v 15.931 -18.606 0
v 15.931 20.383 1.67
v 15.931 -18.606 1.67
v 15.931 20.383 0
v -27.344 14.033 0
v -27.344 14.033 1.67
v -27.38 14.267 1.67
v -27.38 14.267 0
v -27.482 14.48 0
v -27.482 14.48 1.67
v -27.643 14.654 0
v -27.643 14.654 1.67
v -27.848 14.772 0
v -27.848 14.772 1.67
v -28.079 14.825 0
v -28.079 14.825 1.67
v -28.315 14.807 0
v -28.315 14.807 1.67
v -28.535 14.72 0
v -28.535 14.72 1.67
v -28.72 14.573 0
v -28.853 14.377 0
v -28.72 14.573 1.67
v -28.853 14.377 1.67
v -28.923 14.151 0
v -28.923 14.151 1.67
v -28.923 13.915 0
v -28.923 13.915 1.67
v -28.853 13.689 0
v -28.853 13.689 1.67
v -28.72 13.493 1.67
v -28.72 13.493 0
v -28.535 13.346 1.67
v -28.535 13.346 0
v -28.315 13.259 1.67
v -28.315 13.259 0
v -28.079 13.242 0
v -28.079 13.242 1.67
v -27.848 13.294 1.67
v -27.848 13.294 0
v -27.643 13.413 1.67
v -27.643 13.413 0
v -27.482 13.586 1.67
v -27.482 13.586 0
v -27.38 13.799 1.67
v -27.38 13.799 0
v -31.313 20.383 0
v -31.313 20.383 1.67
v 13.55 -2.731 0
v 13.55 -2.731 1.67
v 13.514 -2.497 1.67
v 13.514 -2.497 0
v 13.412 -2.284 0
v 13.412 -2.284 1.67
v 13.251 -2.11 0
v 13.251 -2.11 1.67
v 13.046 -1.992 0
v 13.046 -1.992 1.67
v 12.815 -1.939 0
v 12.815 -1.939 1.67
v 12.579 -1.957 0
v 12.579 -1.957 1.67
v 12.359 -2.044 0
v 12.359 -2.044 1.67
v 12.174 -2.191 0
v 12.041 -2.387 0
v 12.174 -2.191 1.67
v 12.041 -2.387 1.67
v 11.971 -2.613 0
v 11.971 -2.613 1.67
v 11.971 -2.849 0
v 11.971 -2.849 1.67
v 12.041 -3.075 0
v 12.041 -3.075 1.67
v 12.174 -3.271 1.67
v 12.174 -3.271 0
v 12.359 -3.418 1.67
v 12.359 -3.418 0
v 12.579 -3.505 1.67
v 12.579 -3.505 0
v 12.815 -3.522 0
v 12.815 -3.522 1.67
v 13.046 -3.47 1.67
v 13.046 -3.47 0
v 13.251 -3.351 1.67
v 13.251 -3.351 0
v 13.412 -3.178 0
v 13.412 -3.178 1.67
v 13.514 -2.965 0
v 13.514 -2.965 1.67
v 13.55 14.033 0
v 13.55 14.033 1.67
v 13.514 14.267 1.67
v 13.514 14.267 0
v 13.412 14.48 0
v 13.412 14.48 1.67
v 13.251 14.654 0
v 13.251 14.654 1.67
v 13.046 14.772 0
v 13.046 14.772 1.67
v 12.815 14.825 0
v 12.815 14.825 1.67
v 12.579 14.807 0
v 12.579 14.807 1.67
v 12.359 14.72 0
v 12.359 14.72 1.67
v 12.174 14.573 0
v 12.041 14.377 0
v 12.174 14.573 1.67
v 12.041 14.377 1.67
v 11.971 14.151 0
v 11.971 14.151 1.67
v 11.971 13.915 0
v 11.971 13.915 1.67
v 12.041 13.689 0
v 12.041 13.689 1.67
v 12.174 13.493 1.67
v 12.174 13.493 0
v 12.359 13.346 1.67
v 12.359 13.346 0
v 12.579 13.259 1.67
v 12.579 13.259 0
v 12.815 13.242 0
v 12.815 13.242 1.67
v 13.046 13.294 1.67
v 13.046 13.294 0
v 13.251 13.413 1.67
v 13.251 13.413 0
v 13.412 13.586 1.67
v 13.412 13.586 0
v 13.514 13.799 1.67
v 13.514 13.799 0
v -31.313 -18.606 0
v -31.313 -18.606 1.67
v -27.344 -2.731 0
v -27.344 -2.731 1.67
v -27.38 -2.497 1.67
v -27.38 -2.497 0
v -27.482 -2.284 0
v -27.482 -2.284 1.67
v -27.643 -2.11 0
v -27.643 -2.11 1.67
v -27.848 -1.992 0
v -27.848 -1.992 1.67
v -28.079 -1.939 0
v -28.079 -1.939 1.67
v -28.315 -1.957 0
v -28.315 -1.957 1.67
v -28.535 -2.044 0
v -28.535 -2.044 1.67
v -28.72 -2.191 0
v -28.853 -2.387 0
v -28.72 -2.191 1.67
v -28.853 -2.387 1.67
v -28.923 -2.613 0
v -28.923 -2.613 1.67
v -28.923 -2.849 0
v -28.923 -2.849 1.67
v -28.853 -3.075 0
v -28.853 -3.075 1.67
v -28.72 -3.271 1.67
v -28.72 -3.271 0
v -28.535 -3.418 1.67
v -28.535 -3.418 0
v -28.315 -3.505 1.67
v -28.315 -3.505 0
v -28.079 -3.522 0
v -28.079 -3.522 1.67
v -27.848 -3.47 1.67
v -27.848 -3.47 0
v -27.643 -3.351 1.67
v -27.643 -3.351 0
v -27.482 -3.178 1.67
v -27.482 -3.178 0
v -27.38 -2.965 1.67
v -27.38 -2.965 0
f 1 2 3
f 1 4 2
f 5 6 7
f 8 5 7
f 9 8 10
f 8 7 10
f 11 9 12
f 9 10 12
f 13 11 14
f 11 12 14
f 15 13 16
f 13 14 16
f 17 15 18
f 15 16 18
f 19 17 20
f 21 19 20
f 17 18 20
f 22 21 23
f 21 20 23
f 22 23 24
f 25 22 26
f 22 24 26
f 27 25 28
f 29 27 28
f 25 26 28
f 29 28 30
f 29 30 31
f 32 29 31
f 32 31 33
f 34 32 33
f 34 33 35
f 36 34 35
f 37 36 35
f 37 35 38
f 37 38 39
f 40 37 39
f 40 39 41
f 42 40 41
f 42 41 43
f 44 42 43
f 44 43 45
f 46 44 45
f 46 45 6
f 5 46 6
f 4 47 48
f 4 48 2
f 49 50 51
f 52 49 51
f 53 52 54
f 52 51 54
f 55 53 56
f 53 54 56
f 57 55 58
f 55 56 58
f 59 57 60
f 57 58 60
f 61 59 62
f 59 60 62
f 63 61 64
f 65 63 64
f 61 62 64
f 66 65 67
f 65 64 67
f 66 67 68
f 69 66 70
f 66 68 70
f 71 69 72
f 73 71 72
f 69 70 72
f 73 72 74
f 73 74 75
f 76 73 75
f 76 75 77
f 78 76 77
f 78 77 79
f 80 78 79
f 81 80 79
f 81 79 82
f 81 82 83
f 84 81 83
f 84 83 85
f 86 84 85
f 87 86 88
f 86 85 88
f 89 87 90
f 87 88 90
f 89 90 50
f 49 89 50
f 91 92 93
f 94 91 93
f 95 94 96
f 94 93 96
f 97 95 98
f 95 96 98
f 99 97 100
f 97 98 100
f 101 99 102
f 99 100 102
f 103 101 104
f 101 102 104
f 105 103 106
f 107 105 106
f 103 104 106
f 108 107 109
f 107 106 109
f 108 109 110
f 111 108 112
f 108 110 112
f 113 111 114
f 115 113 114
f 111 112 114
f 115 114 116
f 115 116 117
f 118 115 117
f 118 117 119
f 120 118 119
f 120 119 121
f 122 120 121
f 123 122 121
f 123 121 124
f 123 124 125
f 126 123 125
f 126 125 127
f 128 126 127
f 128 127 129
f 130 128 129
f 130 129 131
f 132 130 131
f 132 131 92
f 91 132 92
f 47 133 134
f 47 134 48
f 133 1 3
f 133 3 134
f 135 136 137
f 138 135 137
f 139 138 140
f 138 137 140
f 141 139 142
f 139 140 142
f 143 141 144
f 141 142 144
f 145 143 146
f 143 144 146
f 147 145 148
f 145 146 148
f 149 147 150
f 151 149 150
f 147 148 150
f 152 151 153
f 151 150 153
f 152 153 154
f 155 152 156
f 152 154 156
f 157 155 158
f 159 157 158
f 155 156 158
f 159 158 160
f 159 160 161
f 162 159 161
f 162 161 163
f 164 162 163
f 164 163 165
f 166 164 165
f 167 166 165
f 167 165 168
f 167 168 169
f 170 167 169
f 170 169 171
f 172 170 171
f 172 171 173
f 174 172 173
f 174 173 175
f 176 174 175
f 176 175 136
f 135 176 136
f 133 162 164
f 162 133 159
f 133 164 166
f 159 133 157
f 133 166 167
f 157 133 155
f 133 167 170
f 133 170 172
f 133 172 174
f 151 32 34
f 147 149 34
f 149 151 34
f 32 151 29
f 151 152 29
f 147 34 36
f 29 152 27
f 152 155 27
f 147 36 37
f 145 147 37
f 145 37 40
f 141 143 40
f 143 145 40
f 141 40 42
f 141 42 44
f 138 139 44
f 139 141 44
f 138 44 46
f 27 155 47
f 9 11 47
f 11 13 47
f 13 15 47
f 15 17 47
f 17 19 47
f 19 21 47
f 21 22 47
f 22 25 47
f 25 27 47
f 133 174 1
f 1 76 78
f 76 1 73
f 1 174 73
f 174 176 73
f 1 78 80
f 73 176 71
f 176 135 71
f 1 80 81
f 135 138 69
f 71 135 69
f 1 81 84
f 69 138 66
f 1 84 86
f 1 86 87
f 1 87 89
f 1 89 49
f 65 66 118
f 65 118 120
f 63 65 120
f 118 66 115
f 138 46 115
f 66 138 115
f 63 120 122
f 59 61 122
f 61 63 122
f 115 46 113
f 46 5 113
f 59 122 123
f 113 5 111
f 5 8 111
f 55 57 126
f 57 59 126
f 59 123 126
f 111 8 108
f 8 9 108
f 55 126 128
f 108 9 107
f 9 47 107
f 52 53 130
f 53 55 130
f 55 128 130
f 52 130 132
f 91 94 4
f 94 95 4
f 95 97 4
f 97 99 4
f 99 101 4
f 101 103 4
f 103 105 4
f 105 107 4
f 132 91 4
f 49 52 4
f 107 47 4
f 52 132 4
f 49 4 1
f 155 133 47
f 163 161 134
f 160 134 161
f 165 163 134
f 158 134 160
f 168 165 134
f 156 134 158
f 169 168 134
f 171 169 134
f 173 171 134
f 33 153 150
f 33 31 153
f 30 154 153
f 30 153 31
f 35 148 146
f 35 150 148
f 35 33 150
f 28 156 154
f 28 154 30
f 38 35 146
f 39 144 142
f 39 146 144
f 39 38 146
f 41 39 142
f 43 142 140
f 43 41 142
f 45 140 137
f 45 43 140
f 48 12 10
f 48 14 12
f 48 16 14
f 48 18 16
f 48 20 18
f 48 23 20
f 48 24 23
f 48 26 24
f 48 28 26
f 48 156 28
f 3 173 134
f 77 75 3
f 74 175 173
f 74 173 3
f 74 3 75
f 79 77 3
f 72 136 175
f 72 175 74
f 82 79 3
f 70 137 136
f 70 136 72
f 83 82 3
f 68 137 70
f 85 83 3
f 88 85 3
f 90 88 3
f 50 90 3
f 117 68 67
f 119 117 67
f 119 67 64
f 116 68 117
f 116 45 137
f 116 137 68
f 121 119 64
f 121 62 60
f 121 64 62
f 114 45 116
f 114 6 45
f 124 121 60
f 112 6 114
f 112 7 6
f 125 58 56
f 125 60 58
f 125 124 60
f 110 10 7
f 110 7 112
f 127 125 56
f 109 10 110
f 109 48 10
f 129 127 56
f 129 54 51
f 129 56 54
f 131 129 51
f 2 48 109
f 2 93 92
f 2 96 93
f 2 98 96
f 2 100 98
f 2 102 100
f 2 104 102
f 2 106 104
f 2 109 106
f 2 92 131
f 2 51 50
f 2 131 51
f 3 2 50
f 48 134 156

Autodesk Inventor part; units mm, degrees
ref_plane "YZ Plane" through (0, 0, 0) normal (1, 0, 0) x (0, 1, 0)
ref_plane "XZ Plane" through (0, 0, 0) normal (0, 1, 0) x (-1, 0, 0)
ref_plane "XY Plane" through (0, 0, 0) normal (0, 0, 1) x (1, 0, 0)
sketch "Sketch1" plane through (0, 0, 0) normal (0, 0, 1) x (1, 0, 0)
  line L0 (15.9308, -18.6059) -> (-31.3132, -18.6059)
  line L1 (-31.3132, -18.6059) -> (-31.3132, 20.3831)
  line L2 (-31.3132, 20.3831) -> (15.9308, 20.3831)
  line L3 (15.9308, 20.3831) -> (15.9308, -18.6059)
  point P0 (0, 0)
  dimension "d0" = 38.989
  dimension "d1" = 47.244
extrude "Extrusion1" add sketch "Sketch1" along normal blind 1.67
sketch "Sketch2" plane through (0, 0, 1.67) normal (0, 0, 1) x (1, 0, 0)
  line L0 (-31.3132, -18.6059) -> (15.9308, -18.6059) projected
  line L1 (15.9308, -18.6059) -> (15.9308, 20.3831) projected
  line L2 (15.9308, 20.3831) -> (-31.3132, 20.3831) projected
  line L3 (-31.3132, 20.3831) -> (-31.3132, -18.6059) projected
  circle A0 centre (-28.1382, 14.0331) radius 0.7937
  circle A1 centre (12.7558, 14.0331) radius 0.7937
  circle A2 centre (12.7558, -2.7309) radius 0.7937
  circle A3 centre (-28.1382, -2.7309) radius 0.7937
  point P0 (0, 0)
  dimension "d4" = 1.5875
  dimension "d5" = 1.5875
  dimension "d6" = 1.5875
  dimension "d7" = 1.5875
  dimension "d8" = 3.175
  dimension "d9" = 3.175
  dimension "d10" = 3.175
  dimension "d11" = 3.175
  dimension "d12" = 15.875
  dimension "d13" = 15.875
  dimension "d14" = 6.35
  dimension "d15" = 6.35
extrude "Extrusion2" cut sketch "Sketch2" against normal up to next contours A0 | A1 | A2 | A3
properties part number "CombinerBoard"
